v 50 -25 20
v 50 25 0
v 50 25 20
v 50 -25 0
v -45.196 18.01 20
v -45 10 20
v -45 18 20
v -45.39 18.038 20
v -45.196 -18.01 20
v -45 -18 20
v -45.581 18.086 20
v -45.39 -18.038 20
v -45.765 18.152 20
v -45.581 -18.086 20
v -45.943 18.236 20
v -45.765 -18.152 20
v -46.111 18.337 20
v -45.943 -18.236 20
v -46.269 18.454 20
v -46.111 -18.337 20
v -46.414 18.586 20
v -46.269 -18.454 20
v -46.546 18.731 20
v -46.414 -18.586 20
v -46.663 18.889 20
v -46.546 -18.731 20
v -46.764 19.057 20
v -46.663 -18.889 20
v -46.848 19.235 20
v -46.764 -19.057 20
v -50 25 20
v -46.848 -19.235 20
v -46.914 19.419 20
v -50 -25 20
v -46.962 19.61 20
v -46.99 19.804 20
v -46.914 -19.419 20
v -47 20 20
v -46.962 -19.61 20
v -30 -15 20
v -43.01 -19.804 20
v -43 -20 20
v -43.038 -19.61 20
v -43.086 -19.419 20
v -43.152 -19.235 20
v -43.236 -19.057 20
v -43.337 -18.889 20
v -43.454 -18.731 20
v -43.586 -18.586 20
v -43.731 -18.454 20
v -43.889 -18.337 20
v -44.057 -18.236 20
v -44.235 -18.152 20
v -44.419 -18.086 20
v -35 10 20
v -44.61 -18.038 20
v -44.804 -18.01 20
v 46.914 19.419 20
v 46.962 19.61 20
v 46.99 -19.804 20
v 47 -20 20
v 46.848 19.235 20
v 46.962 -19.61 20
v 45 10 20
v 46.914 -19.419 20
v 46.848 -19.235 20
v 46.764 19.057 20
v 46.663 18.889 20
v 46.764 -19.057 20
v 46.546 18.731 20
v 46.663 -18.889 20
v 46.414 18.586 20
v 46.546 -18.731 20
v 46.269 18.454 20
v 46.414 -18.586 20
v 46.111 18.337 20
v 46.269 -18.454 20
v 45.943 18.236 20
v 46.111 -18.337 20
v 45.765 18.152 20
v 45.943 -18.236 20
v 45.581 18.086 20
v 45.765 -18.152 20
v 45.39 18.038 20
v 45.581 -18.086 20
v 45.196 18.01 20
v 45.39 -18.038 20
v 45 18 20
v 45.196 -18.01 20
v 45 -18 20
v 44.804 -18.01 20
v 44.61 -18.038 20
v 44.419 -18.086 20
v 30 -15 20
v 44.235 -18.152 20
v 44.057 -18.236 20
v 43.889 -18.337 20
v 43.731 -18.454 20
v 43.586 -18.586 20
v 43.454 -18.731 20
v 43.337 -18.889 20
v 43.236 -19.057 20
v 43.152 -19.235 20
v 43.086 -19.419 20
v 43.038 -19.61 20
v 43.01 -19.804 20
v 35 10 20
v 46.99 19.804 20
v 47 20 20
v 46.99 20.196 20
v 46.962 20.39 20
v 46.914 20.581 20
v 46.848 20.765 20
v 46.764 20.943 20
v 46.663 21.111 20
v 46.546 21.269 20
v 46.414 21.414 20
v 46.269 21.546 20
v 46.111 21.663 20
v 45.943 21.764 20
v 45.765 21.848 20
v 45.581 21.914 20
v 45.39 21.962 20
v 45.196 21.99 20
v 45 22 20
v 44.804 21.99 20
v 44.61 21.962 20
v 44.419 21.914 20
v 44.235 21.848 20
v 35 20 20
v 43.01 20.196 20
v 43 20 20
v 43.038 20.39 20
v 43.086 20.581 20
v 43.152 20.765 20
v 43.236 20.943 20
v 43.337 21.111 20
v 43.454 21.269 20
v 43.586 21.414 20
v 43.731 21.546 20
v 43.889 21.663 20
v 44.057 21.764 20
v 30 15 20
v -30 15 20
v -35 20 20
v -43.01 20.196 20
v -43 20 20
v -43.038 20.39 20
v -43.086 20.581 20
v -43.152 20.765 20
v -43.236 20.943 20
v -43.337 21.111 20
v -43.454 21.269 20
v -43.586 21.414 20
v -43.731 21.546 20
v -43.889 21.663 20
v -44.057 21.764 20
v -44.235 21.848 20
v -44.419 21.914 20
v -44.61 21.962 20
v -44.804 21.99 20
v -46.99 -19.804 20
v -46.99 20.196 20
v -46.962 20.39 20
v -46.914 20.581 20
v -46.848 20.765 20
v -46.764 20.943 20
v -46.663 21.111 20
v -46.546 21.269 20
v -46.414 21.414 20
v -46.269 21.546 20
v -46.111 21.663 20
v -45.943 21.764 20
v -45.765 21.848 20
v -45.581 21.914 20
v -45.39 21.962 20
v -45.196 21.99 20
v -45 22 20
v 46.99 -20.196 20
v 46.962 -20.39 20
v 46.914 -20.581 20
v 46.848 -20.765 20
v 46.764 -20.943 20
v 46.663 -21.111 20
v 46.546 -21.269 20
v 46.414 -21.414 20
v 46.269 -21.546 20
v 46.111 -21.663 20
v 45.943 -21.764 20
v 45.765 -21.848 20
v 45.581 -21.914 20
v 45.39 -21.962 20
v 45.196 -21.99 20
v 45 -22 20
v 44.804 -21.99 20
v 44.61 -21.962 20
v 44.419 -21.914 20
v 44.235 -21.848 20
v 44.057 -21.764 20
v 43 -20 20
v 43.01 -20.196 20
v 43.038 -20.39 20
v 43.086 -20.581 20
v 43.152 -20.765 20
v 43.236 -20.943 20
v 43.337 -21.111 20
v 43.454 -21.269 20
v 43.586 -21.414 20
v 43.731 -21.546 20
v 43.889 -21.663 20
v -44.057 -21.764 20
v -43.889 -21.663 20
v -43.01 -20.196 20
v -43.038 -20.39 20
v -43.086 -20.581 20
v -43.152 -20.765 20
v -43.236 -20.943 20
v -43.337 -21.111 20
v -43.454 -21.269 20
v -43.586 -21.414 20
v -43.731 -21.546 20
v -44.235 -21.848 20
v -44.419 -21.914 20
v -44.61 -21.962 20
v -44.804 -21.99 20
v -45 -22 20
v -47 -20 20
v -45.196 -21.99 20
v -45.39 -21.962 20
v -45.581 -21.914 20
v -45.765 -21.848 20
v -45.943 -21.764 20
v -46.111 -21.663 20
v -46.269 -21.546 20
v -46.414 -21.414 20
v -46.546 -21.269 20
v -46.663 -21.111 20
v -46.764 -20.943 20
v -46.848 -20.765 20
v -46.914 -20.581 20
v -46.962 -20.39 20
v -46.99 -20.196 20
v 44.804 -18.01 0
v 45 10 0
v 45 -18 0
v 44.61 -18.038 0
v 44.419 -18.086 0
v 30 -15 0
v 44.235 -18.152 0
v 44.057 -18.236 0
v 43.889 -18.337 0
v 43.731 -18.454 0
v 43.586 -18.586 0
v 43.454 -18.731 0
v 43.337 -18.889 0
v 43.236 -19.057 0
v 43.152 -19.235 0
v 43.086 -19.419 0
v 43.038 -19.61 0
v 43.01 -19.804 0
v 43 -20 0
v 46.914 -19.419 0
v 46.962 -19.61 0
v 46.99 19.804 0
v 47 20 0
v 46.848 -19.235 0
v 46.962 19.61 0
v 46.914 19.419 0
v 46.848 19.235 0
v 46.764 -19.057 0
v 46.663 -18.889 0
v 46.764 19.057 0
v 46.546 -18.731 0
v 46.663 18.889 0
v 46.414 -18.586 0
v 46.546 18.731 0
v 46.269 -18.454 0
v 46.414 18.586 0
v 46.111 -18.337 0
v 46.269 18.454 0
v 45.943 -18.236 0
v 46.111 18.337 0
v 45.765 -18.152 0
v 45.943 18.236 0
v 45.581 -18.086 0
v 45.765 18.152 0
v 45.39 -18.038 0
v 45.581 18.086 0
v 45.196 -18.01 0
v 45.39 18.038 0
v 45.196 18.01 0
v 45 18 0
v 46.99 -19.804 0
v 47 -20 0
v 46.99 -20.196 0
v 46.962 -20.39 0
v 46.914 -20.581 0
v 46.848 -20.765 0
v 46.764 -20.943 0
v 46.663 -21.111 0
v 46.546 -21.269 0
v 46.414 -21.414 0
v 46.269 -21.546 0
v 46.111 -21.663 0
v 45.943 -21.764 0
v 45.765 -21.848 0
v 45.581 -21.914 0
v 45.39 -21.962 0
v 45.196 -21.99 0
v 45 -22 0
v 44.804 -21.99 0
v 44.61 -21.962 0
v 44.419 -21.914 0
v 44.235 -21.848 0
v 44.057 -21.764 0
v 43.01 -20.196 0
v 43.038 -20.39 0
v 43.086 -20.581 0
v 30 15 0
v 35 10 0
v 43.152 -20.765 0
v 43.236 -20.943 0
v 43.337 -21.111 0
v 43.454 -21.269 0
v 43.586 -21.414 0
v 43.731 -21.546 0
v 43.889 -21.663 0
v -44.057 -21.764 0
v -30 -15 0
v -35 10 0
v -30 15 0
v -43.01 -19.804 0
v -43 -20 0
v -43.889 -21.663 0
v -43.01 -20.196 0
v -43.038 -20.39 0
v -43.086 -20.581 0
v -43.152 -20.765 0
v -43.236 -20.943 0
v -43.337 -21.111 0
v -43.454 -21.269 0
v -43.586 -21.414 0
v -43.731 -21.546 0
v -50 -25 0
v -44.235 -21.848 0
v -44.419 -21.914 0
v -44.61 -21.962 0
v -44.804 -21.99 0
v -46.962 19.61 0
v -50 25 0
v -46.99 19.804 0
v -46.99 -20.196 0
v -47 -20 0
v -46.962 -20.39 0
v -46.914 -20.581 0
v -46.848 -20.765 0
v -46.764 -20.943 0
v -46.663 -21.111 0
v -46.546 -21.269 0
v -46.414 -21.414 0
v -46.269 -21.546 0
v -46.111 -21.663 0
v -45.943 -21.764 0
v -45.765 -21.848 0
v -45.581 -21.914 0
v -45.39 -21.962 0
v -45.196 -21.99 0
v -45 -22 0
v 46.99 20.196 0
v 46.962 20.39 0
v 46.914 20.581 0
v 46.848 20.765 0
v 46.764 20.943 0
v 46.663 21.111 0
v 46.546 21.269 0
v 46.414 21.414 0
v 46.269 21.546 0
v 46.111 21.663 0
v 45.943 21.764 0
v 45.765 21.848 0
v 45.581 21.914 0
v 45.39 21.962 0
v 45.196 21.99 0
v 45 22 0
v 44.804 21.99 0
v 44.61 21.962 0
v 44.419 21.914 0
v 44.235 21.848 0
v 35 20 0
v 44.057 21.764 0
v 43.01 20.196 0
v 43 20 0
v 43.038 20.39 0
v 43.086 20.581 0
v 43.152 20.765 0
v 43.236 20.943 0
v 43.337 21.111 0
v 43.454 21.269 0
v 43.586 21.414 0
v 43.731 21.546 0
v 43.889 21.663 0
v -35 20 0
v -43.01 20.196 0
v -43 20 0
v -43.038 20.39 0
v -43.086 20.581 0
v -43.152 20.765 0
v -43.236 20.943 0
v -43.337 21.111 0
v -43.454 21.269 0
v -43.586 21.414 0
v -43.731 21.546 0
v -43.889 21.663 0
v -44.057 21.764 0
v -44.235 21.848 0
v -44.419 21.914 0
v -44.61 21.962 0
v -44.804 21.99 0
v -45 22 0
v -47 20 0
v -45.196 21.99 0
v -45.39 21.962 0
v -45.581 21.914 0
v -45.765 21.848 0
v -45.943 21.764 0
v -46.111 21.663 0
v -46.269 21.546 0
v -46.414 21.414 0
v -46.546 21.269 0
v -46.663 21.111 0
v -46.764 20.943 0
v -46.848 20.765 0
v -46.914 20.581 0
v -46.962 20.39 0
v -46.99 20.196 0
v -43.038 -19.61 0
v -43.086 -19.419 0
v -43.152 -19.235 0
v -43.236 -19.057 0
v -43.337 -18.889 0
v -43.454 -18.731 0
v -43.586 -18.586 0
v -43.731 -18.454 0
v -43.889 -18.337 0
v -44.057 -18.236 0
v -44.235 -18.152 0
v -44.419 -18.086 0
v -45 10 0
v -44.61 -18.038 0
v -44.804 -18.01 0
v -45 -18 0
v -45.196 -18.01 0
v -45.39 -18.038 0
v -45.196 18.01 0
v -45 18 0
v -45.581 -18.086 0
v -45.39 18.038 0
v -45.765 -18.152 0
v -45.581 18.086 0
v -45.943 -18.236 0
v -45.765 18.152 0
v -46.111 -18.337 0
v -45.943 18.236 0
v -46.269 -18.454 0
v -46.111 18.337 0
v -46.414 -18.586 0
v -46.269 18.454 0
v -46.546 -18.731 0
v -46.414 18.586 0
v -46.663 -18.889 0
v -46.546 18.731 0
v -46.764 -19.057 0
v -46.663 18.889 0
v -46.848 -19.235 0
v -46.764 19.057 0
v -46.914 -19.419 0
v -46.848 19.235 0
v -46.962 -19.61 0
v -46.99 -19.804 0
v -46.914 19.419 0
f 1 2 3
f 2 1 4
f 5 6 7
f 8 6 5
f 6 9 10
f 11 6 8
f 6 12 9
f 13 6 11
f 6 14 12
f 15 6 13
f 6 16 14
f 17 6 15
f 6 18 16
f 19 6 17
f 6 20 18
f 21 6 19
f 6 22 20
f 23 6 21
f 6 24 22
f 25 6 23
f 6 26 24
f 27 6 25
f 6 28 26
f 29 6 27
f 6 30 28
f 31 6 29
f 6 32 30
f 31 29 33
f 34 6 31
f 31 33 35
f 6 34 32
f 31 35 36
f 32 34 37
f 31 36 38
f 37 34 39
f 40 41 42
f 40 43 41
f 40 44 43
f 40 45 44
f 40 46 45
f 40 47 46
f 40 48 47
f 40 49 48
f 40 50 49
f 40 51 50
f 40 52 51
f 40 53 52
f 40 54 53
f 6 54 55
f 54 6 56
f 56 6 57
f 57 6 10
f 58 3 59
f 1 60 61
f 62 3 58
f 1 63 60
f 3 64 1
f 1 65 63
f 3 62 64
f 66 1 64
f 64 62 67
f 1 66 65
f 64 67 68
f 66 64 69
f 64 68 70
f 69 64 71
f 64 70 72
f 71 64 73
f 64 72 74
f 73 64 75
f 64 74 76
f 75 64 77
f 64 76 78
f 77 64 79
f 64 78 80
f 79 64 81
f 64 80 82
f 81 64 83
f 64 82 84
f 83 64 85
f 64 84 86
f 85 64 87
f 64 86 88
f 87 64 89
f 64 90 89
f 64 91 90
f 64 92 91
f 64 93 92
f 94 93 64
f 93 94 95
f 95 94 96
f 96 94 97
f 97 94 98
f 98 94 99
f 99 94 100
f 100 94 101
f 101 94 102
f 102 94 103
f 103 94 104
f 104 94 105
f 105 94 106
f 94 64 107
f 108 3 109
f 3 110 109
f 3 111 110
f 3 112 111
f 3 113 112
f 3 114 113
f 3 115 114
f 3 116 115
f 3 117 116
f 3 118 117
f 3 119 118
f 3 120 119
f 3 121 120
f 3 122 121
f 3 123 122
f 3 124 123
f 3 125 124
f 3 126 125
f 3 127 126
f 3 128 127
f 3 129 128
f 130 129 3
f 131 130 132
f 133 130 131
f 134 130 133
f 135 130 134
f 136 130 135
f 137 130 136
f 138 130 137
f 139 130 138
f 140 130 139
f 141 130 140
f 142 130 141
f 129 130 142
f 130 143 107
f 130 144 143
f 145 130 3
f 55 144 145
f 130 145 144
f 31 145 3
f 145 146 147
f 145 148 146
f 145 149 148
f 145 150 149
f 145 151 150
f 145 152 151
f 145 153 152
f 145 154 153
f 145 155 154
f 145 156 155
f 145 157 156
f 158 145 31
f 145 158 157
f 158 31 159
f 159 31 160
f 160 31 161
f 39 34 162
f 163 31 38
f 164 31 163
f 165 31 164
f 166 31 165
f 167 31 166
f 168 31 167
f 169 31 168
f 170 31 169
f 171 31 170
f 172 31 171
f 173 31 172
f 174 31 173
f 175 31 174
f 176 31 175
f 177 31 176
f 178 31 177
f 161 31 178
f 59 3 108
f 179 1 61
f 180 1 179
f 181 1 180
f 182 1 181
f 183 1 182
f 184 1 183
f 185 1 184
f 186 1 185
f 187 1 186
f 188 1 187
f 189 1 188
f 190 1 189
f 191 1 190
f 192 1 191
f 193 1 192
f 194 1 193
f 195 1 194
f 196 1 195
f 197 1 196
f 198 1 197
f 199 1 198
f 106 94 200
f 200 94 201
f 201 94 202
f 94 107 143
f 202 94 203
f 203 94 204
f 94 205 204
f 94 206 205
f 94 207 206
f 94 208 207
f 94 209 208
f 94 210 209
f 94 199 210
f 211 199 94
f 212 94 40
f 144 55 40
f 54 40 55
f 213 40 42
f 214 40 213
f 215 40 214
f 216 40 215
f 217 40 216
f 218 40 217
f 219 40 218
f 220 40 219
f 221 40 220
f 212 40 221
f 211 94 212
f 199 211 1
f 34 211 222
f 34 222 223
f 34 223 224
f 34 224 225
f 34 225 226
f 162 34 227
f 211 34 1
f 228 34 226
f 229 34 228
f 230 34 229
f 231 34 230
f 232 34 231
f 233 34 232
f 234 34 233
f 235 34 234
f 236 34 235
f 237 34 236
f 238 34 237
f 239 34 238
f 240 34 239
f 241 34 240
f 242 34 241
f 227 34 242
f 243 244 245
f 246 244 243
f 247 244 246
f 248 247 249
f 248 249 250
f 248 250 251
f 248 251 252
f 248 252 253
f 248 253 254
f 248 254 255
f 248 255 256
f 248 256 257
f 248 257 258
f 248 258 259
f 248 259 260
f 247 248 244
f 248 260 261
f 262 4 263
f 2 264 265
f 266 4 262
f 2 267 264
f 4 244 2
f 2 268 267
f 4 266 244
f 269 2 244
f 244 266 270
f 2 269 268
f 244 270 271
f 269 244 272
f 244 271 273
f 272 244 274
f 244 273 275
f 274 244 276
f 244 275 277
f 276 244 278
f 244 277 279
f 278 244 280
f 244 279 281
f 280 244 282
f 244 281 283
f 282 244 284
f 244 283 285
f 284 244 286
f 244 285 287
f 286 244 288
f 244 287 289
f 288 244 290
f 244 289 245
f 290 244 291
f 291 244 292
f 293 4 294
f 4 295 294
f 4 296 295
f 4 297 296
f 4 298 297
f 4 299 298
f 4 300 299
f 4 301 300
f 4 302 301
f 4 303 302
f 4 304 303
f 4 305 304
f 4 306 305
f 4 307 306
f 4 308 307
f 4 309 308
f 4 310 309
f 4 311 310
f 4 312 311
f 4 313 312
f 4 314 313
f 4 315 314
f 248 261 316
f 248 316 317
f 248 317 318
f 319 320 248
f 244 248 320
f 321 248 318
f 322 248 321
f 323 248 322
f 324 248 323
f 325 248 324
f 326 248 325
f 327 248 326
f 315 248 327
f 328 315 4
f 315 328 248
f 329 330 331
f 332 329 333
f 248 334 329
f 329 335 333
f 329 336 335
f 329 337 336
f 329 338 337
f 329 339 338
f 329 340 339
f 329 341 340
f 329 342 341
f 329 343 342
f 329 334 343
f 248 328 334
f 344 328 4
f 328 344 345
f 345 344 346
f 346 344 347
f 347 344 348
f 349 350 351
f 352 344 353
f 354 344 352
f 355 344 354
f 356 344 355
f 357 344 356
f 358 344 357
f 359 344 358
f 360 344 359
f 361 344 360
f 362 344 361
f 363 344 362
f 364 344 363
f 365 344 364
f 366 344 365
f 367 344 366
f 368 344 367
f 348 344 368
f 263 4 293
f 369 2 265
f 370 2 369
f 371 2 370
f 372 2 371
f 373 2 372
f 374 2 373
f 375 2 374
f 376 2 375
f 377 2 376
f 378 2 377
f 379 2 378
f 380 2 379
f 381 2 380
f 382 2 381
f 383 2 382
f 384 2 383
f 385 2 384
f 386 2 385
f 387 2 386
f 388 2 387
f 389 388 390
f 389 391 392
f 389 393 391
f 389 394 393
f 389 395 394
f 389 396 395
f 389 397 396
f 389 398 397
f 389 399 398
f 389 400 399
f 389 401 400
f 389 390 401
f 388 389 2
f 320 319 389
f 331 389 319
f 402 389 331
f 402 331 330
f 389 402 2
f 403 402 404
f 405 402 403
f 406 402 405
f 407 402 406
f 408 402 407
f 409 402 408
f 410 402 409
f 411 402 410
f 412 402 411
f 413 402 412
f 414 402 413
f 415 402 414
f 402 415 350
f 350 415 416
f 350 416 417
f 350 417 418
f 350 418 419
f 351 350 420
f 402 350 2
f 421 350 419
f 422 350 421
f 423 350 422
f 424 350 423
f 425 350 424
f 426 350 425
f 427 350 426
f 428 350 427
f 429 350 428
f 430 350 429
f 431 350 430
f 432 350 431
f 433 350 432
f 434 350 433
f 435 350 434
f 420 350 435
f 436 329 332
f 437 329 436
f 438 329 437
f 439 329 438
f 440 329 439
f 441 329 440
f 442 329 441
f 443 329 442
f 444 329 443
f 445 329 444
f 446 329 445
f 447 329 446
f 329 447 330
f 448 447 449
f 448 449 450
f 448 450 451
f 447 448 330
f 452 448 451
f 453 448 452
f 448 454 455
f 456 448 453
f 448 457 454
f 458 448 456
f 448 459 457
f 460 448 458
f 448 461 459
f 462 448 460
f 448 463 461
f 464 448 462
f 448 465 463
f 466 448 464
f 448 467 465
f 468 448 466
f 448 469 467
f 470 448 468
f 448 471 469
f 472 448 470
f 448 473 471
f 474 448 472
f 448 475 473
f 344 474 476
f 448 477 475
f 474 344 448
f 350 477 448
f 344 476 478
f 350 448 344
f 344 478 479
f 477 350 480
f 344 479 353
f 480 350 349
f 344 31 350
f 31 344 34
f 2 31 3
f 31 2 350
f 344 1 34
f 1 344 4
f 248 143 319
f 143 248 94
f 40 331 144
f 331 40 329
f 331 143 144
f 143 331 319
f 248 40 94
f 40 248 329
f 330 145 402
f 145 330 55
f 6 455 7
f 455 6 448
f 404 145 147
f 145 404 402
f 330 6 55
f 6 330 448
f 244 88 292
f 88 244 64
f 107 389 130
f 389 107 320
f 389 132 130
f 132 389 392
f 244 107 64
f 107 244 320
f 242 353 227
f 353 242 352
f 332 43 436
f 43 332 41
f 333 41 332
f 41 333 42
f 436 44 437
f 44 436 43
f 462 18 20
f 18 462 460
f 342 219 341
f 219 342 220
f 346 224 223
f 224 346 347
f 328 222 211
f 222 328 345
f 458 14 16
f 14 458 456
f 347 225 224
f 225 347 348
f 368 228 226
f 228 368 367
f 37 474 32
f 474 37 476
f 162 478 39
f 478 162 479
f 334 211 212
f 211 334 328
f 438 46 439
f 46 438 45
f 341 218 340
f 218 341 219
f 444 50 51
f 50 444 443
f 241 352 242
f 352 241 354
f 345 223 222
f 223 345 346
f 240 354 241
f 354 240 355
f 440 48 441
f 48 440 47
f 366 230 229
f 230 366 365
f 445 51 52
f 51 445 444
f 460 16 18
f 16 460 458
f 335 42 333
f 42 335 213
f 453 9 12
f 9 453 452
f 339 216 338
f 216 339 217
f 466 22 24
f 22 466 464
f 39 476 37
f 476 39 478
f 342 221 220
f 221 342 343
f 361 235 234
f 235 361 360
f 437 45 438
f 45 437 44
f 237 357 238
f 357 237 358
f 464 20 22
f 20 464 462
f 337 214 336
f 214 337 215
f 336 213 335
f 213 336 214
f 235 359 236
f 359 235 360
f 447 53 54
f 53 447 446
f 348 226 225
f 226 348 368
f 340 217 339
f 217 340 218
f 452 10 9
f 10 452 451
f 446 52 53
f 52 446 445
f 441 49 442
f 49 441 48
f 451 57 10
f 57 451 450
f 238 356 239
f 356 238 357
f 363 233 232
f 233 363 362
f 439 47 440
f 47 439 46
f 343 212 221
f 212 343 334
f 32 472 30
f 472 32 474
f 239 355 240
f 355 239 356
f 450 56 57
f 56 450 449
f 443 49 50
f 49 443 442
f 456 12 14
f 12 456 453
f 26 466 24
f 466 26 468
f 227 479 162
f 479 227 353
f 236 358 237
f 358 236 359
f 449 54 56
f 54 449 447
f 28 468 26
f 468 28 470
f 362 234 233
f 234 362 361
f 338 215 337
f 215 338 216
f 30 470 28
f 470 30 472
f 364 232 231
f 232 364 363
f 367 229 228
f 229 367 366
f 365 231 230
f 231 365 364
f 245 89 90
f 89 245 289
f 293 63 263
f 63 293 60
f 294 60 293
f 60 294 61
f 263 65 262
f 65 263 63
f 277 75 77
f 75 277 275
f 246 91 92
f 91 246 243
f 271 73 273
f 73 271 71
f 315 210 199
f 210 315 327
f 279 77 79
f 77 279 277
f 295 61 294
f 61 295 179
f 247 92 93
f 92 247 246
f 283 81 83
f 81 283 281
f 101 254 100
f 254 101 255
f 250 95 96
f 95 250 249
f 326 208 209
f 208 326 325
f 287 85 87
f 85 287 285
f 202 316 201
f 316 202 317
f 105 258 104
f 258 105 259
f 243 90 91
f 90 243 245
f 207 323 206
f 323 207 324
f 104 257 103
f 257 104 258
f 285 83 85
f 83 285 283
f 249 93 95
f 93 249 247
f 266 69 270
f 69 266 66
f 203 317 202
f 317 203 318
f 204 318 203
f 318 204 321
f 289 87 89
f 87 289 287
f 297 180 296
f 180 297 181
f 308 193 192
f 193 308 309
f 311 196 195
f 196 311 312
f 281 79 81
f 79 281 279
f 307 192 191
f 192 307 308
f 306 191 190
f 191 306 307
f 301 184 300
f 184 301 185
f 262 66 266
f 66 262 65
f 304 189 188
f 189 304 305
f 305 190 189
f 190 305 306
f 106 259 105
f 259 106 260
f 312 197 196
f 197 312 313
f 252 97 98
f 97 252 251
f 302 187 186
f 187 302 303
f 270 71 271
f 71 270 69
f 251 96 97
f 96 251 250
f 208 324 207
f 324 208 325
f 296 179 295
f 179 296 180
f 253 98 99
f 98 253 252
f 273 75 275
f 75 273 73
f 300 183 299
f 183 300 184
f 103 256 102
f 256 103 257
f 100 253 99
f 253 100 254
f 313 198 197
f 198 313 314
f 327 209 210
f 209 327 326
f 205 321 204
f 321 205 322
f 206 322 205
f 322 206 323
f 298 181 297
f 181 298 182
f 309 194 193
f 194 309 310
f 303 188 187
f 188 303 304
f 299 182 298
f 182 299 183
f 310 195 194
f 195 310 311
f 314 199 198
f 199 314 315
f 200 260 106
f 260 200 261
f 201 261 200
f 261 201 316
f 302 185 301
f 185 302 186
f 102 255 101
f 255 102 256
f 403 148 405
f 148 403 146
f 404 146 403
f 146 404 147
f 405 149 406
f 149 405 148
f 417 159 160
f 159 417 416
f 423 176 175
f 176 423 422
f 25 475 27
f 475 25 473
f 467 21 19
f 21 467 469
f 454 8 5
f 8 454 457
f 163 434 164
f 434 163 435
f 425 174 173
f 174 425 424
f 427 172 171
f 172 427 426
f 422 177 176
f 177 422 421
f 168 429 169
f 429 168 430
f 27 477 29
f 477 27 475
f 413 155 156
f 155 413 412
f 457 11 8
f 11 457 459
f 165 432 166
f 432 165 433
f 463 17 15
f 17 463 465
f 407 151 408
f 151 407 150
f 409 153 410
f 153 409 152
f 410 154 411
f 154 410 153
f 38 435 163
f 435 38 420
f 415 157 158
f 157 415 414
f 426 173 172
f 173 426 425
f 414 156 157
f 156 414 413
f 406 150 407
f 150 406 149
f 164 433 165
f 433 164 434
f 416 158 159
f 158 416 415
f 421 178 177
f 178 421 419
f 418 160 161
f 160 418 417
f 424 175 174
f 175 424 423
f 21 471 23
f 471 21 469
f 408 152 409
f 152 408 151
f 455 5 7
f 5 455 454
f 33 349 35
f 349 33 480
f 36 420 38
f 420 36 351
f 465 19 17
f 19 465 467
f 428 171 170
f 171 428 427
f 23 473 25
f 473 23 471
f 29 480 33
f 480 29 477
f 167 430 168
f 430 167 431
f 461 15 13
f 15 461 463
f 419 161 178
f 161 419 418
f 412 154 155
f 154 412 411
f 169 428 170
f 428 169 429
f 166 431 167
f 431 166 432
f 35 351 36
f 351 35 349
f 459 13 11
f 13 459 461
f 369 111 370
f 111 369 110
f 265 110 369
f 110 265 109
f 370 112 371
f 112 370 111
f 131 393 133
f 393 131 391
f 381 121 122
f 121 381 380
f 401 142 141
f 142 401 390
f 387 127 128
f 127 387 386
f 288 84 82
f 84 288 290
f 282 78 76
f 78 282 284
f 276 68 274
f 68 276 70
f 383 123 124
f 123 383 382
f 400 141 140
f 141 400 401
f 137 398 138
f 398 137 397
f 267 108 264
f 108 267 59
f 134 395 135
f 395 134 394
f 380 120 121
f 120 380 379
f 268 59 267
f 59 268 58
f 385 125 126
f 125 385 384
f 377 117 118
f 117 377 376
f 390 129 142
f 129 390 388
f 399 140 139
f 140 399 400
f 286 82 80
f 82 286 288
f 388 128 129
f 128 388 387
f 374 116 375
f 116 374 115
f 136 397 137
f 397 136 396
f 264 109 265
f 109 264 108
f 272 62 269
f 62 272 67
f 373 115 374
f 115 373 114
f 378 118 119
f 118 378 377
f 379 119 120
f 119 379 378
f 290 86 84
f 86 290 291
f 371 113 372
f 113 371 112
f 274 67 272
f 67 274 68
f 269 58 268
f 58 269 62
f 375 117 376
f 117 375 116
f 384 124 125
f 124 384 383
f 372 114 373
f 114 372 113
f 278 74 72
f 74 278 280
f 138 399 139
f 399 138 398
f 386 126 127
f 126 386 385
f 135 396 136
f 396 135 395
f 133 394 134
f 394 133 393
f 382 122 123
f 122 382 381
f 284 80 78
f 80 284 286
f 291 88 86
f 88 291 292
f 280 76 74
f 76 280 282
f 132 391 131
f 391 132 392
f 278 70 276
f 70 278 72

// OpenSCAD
module panel_meter() {
    difference() {
        // Main body of the panel meter
        translate([-50, -25, 0])
        cube([100, 50, 20]);

        // Display cutout
        translate([-30, -15, -1])
        cube([60, 30, 21]);

        // Button cutouts
        translate([-45, 10, -1])
        cube([10, 10, 21]);
        translate([35, 10, -1])
        cube([10, 10, 21]);

        // Screw holes
        translate([-45, -20, -1])
        cylinder(h=22, r=2, $fn=64);
        translate([45, -20, -1])
        cylinder(h=22, r=2, $fn=64);
        translate([-45, 20, -1])
        cylinder(h=22, r=2, $fn=64);
        translate([45, 20, -1])
        cylinder(h=22, r=2, $fn=64);
    }
}

panel_meter();
